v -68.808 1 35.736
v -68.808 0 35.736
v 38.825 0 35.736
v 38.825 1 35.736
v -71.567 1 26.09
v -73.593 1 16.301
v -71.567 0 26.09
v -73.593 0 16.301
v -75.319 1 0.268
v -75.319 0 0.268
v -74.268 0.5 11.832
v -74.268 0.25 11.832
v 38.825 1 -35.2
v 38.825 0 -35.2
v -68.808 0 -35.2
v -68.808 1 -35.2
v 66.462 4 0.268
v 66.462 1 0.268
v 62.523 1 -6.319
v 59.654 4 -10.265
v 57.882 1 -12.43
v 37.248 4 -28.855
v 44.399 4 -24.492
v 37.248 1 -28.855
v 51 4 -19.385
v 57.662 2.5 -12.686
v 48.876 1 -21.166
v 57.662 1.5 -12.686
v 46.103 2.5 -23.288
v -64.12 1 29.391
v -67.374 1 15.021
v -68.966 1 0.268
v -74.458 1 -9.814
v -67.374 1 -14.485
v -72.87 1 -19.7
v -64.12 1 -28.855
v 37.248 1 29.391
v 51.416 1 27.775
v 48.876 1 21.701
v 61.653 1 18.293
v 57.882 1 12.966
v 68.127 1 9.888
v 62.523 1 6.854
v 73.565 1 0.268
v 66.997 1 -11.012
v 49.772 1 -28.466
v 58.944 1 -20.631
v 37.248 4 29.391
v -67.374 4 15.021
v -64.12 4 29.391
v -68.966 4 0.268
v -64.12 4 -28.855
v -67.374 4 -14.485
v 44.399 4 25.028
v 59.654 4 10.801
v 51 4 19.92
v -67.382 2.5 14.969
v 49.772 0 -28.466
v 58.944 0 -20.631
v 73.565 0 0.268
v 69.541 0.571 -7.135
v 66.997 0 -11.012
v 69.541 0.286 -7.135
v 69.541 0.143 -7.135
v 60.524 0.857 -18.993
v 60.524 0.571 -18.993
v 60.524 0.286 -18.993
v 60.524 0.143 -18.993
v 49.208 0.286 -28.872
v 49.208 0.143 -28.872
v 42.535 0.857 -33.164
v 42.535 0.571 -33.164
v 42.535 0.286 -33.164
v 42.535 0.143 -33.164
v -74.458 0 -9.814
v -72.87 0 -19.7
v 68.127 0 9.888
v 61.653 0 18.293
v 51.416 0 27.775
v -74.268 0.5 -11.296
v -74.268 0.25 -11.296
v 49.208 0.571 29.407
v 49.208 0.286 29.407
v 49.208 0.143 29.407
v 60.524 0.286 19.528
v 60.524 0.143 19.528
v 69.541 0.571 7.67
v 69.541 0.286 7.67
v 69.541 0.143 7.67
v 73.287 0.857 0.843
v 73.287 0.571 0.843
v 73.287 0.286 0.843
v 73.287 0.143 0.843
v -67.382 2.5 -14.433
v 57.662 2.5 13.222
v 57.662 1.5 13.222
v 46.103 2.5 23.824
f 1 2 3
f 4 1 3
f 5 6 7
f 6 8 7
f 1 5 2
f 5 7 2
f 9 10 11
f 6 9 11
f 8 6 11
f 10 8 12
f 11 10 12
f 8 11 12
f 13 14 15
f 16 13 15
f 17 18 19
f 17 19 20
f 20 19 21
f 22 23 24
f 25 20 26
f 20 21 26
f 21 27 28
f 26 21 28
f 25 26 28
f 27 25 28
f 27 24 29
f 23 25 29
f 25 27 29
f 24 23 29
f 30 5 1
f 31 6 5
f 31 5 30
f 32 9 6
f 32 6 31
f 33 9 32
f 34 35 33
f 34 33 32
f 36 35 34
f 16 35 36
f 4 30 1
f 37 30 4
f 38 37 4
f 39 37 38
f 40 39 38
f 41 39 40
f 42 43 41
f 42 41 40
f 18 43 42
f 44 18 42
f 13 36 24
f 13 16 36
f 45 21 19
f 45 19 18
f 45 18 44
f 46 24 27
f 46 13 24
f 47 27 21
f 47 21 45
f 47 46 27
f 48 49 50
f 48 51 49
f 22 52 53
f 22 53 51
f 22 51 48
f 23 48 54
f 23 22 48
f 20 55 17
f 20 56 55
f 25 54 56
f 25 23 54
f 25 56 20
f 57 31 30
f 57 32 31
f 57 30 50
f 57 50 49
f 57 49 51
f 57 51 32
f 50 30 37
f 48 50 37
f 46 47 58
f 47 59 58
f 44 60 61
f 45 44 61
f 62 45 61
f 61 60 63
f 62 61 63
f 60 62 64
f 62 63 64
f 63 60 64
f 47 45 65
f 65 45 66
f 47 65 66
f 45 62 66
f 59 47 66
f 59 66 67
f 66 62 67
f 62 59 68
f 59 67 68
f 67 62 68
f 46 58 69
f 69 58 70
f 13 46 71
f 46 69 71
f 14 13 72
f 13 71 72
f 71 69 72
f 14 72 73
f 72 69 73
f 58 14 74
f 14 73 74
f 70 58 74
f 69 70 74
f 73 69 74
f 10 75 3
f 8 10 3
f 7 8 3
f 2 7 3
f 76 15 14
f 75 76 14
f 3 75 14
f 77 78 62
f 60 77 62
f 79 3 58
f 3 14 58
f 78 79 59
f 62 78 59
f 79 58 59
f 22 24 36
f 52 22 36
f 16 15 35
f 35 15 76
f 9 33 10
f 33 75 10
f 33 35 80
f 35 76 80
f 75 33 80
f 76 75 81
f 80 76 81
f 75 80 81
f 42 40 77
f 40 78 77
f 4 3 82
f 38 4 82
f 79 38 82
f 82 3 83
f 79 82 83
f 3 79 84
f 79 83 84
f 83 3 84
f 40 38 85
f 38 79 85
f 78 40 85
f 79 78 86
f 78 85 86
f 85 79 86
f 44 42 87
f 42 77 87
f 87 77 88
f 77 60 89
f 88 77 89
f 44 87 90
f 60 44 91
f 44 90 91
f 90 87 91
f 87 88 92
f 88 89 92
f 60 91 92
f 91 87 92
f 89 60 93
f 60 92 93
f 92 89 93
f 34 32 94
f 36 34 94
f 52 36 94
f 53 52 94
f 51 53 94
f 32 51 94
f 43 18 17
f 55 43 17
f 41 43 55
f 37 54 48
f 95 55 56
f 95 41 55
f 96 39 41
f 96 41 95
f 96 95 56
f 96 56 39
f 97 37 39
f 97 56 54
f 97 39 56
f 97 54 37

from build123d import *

# Parameters (mm, degrees)
SALIENTE_EXTRUIR4_DEPTH = 1
SALIENTE_EXTRUIR5_DEPTH = 4


with BuildPart() as part:
    # Croquis1 → Saliente-Extruir4 (new body)
    with BuildSketch(Plane(origin=(0, 0, 0), x_dir=(1, 0, 0), z_dir=(0, 1, 0))):
        with BuildLine():
            Line((-68.807549393, -35.735609902), (38.825281278, -35.735609902))
            add(Edge.make_bspline(
                [(38.825281278, -35.735609902), (38.857624552, -35.718822416), (38.889937105, -35.702026903), (40.163492425, -35.039106907), (41.363053394, -34.379508835), (44.879608288, -32.340972971), (47.103940203, -30.908125592), (53.416675645, -26.4056608), (57.158292578, -23.128173527), (63.889280185, -15.928414127), (66.879657947, -12.004947025), (70.871982915, -5.502682168), (72.121484201, -3.228479298), (73.380247303, -0.652201666), (73.473116384, -0.460315749), (73.565425725, -0.267750564)],
                knots=[0.132682558, 0.132682558, 0.132682558, 0.132682558, 0.13425238, 0.13425238, 0.194615488, 0.194615488, 0.315341705, 0.315341705, 0.556794137, 0.556794137, 0.79824657, 0.79824657, 0.918972787, 0.918972787, 0.928652581, 0.928652581, 0.928652581, 0.928652581], degree=3))
            add(Edge.make_bspline(
                [(73.565425725, -0.267750564), (73.473116384, -0.07518538), (73.380247303, 0.116700538), (72.121484201, 2.692978169), (70.871982915, 4.967181039), (66.879657947, 11.469445896), (63.889280185, 15.392912998), (57.158292578, 22.592672399), (53.416675646, 25.870159671), (47.103940203, 30.372624464), (44.879608287, 31.805471842), (41.363053394, 33.844007706), (40.163492425, 34.503605779), (38.889937105, 35.166525774), (38.857624552, 35.183321288), (38.825281278, 35.200108773)],
                knots=[0.132682558, 0.132682558, 0.132682558, 0.132682558, 0.142362352, 0.142362352, 0.263088569, 0.263088569, 0.504541001, 0.504541001, 0.745993434, 0.745993434, 0.866719651, 0.866719651, 0.927082759, 0.927082759, 0.928652581, 0.928652581, 0.928652581, 0.928652581], degree=3))
            Line((38.825281278, 35.200108773), (-68.807549393, 35.200108773))
            add(Edge.make_bspline(
                [(-68.807549393, 35.200108773), (-70.080284046, 31.302990951), (-71.169252334, 27.374853959), (-72.991045883, 19.413196683), (-73.721201284, 15.377083685), (-74.541341264, 9.255508785), (-74.768651118, 7.205452815), (-75.107581304, 3.346349854), (-75.230698844, 1.538874232), (-75.318593087, -0.267750565)],
                knots=[0.290505717, 0.290505717, 0.290505717, 0.290505717, 0.524524567, 0.524524567, 0.760550999, 0.760550999, 0.878564216, 0.878564216, 0.980861336, 0.980861336, 0.980861336, 0.980861336], degree=3))
            add(Edge.make_bspline(
                [(-75.318593087, -0.267750565), (-75.230698844, -2.074375361), (-75.107581304, -3.881850983), (-74.768651118, -7.740953944), (-74.541341264, -9.791009913), (-73.721201284, -15.912584814), (-72.991045883, -19.948697811), (-71.169252334, -27.910355088), (-70.080284046, -31.838492079), (-68.807549393, -35.735609902)],
                knots=[0.290505717, 0.290505717, 0.290505717, 0.290505717, 0.392802838, 0.392802838, 0.510816054, 0.510816054, 0.746842486, 0.746842486, 0.980861336, 0.980861336, 0.980861336, 0.980861336], degree=3))
        make_face()
    extrude(amount=SALIENTE_EXTRUIR4_DEPTH)

    # Croquis4 → Saliente-Extruir5 (add)
    with BuildSketch(Plane(origin=(0, 0, 0), x_dir=(1, 0, 0), z_dir=(0, 1, 0))):
        with BuildLine():
            Line((37.247663382, 28.855017698), (-64.119969997, 28.855017698))
            add(Edge.make_bspline(
                [(-64.119969997, 28.855017698), (-65.485825703, 24.110871923), (-66.573936798, 19.303338214), (-68.190809552, 9.563299345), (-68.714330818, 4.66248528), (-68.96563874, -0.267750565)],
                knots=[0, 0, 0, 0, 0.5, 0.5, 1, 1, 1, 1], degree=3))
            add(Edge.make_bspline(
                [(-64.119969997, -29.390518826), (-65.485825703, -24.646373051), (-66.573936798, -19.838839342), (-68.190809552, -10.098800474), (-68.714330818, -5.197986409), (-68.96563874, -0.267750565)],
                knots=[0, 0, 0, 0, 0.5, 0.5, 1, 1, 1, 1], degree=3))
            Line((-64.119969997, -29.390518826), (37.247663382, -29.390518826))
            add(Edge.make_bspline(
                [(66.462106503, -0.267750564), (64.818621385, -3.374433842), (62.975742409, -6.335483667), (59.886080558, -10.539433832), (58.80173399, -11.900974536), (57.091612362, -13.882224457), (56.507662174, -14.532481759), (55.311926642, -15.812666099), (54.698983392, -16.443734837), (51.578159003, -19.532591798), (48.914439134, -21.777803713), (43.292419218, -25.869940939), (40.335081649, -27.71816757), (37.247663382, -29.390518826)],
                knots=[0, 0, 0, 0, 0.25, 0.25, 0.375, 0.375, 0.4375, 0.4375, 0.5, 0.5, 0.75, 0.75, 1, 1, 1, 1], degree=3))
            add(Edge.make_bspline(
                [(66.462106503, -0.267750564), (64.818621385, 2.838932714), (62.975742409, 5.799982539), (59.886080558, 10.003932703), (58.80173399, 11.365473408), (57.091612362, 13.346723328), (56.507662174, 13.996980631), (55.311926642, 15.277164971), (54.698983392, 15.908233708), (51.578159003, 18.99709067), (48.914439134, 21.242302584), (43.292419218, 25.334439811), (40.335081649, 27.182666442), (37.247663382, 28.855017698)],
                knots=[0, 0, 0, 0, 0.25, 0.25, 0.375, 0.375, 0.4375, 0.4375, 0.5, 0.5, 0.75, 0.75, 1, 1, 1, 1], degree=3))
        make_face()
    extrude(amount=SALIENTE_EXTRUIR5_DEPTH)


solid = part.part
